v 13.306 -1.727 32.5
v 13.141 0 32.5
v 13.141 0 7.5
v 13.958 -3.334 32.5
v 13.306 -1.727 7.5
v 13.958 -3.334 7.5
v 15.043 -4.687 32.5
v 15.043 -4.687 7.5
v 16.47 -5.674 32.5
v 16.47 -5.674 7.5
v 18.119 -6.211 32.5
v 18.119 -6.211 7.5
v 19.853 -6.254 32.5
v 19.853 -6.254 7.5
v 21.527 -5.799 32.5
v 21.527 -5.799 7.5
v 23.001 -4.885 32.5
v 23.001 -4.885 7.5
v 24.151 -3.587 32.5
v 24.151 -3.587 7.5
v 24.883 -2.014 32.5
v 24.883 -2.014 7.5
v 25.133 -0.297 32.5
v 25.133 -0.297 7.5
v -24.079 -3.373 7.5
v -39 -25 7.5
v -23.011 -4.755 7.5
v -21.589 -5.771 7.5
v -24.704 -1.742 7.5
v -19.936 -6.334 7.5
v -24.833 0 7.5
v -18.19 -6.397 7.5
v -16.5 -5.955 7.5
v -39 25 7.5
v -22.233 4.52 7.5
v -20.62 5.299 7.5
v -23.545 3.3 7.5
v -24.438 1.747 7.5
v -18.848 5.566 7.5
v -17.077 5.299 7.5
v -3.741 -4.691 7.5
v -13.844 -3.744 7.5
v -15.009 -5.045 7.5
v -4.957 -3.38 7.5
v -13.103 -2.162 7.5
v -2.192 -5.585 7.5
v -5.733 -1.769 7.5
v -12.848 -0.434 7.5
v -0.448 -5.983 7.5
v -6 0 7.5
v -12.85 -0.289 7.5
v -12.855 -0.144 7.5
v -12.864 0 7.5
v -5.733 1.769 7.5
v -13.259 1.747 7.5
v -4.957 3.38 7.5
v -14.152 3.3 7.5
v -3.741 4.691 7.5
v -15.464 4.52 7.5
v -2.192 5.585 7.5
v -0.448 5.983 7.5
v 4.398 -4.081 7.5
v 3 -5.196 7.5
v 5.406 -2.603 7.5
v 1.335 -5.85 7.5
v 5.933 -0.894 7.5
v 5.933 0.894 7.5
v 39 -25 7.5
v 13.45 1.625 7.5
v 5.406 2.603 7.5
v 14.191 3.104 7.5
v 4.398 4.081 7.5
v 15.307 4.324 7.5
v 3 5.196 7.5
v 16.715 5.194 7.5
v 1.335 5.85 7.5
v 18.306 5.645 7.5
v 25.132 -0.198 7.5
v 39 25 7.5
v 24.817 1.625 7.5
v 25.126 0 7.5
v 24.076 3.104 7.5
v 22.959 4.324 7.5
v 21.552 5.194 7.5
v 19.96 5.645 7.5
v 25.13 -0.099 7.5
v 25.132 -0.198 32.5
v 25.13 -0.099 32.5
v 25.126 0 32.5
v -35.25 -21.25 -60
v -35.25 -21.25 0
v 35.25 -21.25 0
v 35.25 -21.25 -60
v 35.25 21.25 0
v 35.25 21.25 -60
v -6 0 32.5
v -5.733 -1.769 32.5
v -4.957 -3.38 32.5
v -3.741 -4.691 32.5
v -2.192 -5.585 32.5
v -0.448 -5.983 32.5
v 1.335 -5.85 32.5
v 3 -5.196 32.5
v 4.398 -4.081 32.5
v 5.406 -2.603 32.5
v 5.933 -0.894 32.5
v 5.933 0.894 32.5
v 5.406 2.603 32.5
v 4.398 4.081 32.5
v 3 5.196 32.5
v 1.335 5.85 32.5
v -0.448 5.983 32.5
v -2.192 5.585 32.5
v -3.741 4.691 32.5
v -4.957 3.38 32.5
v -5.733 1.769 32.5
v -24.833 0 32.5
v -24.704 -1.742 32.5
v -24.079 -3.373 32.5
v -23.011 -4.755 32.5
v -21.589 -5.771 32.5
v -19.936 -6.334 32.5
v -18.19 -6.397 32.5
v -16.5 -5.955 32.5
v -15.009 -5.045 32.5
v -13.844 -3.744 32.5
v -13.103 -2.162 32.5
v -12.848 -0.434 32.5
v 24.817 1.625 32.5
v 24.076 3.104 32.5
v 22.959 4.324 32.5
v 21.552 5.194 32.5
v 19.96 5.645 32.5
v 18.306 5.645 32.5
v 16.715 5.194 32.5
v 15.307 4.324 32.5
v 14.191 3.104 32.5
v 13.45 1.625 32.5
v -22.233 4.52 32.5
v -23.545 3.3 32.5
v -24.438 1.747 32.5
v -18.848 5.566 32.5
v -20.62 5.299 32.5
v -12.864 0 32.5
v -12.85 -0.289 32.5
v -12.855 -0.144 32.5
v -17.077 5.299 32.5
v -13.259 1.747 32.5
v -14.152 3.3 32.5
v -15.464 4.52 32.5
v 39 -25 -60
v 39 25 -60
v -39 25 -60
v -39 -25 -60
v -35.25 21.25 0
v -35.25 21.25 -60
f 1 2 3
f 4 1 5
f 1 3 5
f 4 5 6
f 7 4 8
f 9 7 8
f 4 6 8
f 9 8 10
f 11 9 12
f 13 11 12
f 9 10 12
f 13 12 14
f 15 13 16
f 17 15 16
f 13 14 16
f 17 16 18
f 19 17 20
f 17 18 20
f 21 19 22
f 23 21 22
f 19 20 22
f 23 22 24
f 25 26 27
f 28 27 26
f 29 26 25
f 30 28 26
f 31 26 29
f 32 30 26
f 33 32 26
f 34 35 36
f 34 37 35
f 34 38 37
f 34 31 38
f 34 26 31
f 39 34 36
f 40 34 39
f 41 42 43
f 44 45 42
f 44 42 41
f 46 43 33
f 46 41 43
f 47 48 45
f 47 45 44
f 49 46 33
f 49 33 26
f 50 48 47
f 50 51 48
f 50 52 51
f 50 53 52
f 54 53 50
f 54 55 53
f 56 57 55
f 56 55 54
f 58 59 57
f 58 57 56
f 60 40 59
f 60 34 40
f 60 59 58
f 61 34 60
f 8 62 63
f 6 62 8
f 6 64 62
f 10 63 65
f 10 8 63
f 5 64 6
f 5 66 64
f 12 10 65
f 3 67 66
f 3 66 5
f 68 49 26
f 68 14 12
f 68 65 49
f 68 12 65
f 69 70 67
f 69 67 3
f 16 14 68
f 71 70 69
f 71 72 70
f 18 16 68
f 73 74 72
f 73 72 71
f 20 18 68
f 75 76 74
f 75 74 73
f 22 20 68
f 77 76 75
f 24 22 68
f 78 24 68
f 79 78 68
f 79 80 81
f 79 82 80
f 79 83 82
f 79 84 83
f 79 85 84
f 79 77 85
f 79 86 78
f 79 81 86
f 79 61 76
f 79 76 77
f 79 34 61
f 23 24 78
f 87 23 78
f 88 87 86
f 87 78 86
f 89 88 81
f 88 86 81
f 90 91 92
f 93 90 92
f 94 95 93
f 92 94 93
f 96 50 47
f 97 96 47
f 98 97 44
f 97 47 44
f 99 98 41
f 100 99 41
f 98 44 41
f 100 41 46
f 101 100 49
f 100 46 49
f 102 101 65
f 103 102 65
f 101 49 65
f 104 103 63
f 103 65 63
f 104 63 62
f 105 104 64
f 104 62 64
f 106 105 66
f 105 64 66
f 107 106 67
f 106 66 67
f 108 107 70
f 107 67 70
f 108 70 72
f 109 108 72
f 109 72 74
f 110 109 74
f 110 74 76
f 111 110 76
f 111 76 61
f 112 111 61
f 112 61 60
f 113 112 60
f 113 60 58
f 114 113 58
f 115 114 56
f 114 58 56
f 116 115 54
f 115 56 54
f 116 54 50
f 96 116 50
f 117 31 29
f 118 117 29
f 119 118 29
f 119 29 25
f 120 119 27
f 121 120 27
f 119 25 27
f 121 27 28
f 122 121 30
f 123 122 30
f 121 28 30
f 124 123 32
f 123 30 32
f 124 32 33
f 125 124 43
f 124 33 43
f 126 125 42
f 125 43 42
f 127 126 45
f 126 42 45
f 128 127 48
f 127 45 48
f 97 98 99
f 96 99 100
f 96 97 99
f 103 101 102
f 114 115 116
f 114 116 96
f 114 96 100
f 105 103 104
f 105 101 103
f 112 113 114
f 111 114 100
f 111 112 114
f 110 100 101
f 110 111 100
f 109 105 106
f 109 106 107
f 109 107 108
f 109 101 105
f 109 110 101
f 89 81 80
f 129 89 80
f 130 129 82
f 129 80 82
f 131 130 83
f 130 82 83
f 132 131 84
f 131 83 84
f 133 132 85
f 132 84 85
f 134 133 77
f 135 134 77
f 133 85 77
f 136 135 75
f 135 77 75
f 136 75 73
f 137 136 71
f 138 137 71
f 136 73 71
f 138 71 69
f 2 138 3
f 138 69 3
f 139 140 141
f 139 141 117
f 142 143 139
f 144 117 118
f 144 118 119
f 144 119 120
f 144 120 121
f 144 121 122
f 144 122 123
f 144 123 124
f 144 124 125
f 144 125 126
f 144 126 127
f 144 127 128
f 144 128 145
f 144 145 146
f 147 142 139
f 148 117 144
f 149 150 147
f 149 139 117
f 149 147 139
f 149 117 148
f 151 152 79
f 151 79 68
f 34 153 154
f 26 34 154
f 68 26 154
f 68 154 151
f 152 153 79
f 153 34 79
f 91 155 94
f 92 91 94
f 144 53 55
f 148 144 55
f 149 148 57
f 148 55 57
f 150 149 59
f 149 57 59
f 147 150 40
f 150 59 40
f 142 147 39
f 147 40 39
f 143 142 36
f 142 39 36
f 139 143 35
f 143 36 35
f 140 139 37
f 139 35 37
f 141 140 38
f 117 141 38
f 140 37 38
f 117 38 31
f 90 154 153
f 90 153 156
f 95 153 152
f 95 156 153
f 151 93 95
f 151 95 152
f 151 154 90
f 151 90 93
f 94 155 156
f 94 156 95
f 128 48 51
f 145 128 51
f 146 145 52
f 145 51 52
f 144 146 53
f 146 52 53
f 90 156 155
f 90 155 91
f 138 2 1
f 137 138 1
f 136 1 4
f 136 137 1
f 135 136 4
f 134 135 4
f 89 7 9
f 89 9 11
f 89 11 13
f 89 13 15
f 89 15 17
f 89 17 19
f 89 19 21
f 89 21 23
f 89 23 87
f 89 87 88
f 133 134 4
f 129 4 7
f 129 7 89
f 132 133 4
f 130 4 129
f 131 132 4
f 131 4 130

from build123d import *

# Parameters (mm, degrees)
F0_W     = 78
F0_H     = 50
F1_DEPTH = 7.5
F3_DEPTH = 25
F4_W     = 78
F4_H     = 50
F4_W_2   = 70.5
F4_H_2   = 42.5
F5_DEPTH = 60


with BuildPart() as f1:
    # F0 (on Top) → F1 (new body)
    with BuildSketch(Plane.XY):
        Rectangle(F0_W, F0_H)
    extrude(amount=F1_DEPTH)

    # F2 (on face) → F3 (join)
    with BuildSketch(Plane.XY.offset(7.5)):
        with BuildLine():
            Line((-24.8326521918, 0), (-12.8640334502, 0))
            ThreePointArc((-12.8640334502, 0), (-18.848342821, 5.5663626469), (-24.8326521918, 0))
        make_face()
        with BuildLine():
            ThreePointArc((-12.848342821, -0.4336373531), (-12.8522667614, -0.2166767865), (-12.8640334502, 0))
            Line((-12.8640334502, 0), (-24.8326521918, 0))
            ThreePointArc((-24.8326521918, 0), (-19.0653033876, -6.4297134127), (-12.848342821, -0.4336373531))
        make_face()
        with BuildLine():
            Line((-6, 0), (0, 0))
            Line((0, 0), (6, 0))
            ThreePointArc((6, 0), (0, 6), (-6, 0))
        make_face()
        with BuildLine():
            Line((6, 0), (0, 0))
            Line((0, 0), (-6, 0))
            ThreePointArc((-6, 0), (0, -6), (6, 0))
        make_face()
        with BuildLine():
            ThreePointArc((25.1258996345, 0), (19.1332791001, 5.7025119665), (13.1406585656, 0))
            Line((13.1406585656, 0), (25.1258996345, 0))
        make_face()
        with BuildLine():
            Line((25.1258996345, 0), (13.1406585656, 0))
            ThreePointArc((13.1406585656, 0), (18.9844893267, -6.2956428834), (25.1332791001, -0.2974880335))
            ThreePointArc((25.1332791001, -0.2974880335), (25.13143395, -0.1486982602), (25.1258996345, 0))
        make_face()
    extrude(amount=F3_DEPTH)

    # F4 (on face) → F5 (join)
    with BuildSketch(Plane(origin=(0, 0, 0), x_dir=(1, 0, 0), z_dir=(0, 0, -1))):
        Rectangle(F4_W, F4_H)
        Rectangle(F4_W_2, F4_H_2, mode=Mode.SUBTRACT)
    extrude(amount=F5_DEPTH)


solid = f1.part
